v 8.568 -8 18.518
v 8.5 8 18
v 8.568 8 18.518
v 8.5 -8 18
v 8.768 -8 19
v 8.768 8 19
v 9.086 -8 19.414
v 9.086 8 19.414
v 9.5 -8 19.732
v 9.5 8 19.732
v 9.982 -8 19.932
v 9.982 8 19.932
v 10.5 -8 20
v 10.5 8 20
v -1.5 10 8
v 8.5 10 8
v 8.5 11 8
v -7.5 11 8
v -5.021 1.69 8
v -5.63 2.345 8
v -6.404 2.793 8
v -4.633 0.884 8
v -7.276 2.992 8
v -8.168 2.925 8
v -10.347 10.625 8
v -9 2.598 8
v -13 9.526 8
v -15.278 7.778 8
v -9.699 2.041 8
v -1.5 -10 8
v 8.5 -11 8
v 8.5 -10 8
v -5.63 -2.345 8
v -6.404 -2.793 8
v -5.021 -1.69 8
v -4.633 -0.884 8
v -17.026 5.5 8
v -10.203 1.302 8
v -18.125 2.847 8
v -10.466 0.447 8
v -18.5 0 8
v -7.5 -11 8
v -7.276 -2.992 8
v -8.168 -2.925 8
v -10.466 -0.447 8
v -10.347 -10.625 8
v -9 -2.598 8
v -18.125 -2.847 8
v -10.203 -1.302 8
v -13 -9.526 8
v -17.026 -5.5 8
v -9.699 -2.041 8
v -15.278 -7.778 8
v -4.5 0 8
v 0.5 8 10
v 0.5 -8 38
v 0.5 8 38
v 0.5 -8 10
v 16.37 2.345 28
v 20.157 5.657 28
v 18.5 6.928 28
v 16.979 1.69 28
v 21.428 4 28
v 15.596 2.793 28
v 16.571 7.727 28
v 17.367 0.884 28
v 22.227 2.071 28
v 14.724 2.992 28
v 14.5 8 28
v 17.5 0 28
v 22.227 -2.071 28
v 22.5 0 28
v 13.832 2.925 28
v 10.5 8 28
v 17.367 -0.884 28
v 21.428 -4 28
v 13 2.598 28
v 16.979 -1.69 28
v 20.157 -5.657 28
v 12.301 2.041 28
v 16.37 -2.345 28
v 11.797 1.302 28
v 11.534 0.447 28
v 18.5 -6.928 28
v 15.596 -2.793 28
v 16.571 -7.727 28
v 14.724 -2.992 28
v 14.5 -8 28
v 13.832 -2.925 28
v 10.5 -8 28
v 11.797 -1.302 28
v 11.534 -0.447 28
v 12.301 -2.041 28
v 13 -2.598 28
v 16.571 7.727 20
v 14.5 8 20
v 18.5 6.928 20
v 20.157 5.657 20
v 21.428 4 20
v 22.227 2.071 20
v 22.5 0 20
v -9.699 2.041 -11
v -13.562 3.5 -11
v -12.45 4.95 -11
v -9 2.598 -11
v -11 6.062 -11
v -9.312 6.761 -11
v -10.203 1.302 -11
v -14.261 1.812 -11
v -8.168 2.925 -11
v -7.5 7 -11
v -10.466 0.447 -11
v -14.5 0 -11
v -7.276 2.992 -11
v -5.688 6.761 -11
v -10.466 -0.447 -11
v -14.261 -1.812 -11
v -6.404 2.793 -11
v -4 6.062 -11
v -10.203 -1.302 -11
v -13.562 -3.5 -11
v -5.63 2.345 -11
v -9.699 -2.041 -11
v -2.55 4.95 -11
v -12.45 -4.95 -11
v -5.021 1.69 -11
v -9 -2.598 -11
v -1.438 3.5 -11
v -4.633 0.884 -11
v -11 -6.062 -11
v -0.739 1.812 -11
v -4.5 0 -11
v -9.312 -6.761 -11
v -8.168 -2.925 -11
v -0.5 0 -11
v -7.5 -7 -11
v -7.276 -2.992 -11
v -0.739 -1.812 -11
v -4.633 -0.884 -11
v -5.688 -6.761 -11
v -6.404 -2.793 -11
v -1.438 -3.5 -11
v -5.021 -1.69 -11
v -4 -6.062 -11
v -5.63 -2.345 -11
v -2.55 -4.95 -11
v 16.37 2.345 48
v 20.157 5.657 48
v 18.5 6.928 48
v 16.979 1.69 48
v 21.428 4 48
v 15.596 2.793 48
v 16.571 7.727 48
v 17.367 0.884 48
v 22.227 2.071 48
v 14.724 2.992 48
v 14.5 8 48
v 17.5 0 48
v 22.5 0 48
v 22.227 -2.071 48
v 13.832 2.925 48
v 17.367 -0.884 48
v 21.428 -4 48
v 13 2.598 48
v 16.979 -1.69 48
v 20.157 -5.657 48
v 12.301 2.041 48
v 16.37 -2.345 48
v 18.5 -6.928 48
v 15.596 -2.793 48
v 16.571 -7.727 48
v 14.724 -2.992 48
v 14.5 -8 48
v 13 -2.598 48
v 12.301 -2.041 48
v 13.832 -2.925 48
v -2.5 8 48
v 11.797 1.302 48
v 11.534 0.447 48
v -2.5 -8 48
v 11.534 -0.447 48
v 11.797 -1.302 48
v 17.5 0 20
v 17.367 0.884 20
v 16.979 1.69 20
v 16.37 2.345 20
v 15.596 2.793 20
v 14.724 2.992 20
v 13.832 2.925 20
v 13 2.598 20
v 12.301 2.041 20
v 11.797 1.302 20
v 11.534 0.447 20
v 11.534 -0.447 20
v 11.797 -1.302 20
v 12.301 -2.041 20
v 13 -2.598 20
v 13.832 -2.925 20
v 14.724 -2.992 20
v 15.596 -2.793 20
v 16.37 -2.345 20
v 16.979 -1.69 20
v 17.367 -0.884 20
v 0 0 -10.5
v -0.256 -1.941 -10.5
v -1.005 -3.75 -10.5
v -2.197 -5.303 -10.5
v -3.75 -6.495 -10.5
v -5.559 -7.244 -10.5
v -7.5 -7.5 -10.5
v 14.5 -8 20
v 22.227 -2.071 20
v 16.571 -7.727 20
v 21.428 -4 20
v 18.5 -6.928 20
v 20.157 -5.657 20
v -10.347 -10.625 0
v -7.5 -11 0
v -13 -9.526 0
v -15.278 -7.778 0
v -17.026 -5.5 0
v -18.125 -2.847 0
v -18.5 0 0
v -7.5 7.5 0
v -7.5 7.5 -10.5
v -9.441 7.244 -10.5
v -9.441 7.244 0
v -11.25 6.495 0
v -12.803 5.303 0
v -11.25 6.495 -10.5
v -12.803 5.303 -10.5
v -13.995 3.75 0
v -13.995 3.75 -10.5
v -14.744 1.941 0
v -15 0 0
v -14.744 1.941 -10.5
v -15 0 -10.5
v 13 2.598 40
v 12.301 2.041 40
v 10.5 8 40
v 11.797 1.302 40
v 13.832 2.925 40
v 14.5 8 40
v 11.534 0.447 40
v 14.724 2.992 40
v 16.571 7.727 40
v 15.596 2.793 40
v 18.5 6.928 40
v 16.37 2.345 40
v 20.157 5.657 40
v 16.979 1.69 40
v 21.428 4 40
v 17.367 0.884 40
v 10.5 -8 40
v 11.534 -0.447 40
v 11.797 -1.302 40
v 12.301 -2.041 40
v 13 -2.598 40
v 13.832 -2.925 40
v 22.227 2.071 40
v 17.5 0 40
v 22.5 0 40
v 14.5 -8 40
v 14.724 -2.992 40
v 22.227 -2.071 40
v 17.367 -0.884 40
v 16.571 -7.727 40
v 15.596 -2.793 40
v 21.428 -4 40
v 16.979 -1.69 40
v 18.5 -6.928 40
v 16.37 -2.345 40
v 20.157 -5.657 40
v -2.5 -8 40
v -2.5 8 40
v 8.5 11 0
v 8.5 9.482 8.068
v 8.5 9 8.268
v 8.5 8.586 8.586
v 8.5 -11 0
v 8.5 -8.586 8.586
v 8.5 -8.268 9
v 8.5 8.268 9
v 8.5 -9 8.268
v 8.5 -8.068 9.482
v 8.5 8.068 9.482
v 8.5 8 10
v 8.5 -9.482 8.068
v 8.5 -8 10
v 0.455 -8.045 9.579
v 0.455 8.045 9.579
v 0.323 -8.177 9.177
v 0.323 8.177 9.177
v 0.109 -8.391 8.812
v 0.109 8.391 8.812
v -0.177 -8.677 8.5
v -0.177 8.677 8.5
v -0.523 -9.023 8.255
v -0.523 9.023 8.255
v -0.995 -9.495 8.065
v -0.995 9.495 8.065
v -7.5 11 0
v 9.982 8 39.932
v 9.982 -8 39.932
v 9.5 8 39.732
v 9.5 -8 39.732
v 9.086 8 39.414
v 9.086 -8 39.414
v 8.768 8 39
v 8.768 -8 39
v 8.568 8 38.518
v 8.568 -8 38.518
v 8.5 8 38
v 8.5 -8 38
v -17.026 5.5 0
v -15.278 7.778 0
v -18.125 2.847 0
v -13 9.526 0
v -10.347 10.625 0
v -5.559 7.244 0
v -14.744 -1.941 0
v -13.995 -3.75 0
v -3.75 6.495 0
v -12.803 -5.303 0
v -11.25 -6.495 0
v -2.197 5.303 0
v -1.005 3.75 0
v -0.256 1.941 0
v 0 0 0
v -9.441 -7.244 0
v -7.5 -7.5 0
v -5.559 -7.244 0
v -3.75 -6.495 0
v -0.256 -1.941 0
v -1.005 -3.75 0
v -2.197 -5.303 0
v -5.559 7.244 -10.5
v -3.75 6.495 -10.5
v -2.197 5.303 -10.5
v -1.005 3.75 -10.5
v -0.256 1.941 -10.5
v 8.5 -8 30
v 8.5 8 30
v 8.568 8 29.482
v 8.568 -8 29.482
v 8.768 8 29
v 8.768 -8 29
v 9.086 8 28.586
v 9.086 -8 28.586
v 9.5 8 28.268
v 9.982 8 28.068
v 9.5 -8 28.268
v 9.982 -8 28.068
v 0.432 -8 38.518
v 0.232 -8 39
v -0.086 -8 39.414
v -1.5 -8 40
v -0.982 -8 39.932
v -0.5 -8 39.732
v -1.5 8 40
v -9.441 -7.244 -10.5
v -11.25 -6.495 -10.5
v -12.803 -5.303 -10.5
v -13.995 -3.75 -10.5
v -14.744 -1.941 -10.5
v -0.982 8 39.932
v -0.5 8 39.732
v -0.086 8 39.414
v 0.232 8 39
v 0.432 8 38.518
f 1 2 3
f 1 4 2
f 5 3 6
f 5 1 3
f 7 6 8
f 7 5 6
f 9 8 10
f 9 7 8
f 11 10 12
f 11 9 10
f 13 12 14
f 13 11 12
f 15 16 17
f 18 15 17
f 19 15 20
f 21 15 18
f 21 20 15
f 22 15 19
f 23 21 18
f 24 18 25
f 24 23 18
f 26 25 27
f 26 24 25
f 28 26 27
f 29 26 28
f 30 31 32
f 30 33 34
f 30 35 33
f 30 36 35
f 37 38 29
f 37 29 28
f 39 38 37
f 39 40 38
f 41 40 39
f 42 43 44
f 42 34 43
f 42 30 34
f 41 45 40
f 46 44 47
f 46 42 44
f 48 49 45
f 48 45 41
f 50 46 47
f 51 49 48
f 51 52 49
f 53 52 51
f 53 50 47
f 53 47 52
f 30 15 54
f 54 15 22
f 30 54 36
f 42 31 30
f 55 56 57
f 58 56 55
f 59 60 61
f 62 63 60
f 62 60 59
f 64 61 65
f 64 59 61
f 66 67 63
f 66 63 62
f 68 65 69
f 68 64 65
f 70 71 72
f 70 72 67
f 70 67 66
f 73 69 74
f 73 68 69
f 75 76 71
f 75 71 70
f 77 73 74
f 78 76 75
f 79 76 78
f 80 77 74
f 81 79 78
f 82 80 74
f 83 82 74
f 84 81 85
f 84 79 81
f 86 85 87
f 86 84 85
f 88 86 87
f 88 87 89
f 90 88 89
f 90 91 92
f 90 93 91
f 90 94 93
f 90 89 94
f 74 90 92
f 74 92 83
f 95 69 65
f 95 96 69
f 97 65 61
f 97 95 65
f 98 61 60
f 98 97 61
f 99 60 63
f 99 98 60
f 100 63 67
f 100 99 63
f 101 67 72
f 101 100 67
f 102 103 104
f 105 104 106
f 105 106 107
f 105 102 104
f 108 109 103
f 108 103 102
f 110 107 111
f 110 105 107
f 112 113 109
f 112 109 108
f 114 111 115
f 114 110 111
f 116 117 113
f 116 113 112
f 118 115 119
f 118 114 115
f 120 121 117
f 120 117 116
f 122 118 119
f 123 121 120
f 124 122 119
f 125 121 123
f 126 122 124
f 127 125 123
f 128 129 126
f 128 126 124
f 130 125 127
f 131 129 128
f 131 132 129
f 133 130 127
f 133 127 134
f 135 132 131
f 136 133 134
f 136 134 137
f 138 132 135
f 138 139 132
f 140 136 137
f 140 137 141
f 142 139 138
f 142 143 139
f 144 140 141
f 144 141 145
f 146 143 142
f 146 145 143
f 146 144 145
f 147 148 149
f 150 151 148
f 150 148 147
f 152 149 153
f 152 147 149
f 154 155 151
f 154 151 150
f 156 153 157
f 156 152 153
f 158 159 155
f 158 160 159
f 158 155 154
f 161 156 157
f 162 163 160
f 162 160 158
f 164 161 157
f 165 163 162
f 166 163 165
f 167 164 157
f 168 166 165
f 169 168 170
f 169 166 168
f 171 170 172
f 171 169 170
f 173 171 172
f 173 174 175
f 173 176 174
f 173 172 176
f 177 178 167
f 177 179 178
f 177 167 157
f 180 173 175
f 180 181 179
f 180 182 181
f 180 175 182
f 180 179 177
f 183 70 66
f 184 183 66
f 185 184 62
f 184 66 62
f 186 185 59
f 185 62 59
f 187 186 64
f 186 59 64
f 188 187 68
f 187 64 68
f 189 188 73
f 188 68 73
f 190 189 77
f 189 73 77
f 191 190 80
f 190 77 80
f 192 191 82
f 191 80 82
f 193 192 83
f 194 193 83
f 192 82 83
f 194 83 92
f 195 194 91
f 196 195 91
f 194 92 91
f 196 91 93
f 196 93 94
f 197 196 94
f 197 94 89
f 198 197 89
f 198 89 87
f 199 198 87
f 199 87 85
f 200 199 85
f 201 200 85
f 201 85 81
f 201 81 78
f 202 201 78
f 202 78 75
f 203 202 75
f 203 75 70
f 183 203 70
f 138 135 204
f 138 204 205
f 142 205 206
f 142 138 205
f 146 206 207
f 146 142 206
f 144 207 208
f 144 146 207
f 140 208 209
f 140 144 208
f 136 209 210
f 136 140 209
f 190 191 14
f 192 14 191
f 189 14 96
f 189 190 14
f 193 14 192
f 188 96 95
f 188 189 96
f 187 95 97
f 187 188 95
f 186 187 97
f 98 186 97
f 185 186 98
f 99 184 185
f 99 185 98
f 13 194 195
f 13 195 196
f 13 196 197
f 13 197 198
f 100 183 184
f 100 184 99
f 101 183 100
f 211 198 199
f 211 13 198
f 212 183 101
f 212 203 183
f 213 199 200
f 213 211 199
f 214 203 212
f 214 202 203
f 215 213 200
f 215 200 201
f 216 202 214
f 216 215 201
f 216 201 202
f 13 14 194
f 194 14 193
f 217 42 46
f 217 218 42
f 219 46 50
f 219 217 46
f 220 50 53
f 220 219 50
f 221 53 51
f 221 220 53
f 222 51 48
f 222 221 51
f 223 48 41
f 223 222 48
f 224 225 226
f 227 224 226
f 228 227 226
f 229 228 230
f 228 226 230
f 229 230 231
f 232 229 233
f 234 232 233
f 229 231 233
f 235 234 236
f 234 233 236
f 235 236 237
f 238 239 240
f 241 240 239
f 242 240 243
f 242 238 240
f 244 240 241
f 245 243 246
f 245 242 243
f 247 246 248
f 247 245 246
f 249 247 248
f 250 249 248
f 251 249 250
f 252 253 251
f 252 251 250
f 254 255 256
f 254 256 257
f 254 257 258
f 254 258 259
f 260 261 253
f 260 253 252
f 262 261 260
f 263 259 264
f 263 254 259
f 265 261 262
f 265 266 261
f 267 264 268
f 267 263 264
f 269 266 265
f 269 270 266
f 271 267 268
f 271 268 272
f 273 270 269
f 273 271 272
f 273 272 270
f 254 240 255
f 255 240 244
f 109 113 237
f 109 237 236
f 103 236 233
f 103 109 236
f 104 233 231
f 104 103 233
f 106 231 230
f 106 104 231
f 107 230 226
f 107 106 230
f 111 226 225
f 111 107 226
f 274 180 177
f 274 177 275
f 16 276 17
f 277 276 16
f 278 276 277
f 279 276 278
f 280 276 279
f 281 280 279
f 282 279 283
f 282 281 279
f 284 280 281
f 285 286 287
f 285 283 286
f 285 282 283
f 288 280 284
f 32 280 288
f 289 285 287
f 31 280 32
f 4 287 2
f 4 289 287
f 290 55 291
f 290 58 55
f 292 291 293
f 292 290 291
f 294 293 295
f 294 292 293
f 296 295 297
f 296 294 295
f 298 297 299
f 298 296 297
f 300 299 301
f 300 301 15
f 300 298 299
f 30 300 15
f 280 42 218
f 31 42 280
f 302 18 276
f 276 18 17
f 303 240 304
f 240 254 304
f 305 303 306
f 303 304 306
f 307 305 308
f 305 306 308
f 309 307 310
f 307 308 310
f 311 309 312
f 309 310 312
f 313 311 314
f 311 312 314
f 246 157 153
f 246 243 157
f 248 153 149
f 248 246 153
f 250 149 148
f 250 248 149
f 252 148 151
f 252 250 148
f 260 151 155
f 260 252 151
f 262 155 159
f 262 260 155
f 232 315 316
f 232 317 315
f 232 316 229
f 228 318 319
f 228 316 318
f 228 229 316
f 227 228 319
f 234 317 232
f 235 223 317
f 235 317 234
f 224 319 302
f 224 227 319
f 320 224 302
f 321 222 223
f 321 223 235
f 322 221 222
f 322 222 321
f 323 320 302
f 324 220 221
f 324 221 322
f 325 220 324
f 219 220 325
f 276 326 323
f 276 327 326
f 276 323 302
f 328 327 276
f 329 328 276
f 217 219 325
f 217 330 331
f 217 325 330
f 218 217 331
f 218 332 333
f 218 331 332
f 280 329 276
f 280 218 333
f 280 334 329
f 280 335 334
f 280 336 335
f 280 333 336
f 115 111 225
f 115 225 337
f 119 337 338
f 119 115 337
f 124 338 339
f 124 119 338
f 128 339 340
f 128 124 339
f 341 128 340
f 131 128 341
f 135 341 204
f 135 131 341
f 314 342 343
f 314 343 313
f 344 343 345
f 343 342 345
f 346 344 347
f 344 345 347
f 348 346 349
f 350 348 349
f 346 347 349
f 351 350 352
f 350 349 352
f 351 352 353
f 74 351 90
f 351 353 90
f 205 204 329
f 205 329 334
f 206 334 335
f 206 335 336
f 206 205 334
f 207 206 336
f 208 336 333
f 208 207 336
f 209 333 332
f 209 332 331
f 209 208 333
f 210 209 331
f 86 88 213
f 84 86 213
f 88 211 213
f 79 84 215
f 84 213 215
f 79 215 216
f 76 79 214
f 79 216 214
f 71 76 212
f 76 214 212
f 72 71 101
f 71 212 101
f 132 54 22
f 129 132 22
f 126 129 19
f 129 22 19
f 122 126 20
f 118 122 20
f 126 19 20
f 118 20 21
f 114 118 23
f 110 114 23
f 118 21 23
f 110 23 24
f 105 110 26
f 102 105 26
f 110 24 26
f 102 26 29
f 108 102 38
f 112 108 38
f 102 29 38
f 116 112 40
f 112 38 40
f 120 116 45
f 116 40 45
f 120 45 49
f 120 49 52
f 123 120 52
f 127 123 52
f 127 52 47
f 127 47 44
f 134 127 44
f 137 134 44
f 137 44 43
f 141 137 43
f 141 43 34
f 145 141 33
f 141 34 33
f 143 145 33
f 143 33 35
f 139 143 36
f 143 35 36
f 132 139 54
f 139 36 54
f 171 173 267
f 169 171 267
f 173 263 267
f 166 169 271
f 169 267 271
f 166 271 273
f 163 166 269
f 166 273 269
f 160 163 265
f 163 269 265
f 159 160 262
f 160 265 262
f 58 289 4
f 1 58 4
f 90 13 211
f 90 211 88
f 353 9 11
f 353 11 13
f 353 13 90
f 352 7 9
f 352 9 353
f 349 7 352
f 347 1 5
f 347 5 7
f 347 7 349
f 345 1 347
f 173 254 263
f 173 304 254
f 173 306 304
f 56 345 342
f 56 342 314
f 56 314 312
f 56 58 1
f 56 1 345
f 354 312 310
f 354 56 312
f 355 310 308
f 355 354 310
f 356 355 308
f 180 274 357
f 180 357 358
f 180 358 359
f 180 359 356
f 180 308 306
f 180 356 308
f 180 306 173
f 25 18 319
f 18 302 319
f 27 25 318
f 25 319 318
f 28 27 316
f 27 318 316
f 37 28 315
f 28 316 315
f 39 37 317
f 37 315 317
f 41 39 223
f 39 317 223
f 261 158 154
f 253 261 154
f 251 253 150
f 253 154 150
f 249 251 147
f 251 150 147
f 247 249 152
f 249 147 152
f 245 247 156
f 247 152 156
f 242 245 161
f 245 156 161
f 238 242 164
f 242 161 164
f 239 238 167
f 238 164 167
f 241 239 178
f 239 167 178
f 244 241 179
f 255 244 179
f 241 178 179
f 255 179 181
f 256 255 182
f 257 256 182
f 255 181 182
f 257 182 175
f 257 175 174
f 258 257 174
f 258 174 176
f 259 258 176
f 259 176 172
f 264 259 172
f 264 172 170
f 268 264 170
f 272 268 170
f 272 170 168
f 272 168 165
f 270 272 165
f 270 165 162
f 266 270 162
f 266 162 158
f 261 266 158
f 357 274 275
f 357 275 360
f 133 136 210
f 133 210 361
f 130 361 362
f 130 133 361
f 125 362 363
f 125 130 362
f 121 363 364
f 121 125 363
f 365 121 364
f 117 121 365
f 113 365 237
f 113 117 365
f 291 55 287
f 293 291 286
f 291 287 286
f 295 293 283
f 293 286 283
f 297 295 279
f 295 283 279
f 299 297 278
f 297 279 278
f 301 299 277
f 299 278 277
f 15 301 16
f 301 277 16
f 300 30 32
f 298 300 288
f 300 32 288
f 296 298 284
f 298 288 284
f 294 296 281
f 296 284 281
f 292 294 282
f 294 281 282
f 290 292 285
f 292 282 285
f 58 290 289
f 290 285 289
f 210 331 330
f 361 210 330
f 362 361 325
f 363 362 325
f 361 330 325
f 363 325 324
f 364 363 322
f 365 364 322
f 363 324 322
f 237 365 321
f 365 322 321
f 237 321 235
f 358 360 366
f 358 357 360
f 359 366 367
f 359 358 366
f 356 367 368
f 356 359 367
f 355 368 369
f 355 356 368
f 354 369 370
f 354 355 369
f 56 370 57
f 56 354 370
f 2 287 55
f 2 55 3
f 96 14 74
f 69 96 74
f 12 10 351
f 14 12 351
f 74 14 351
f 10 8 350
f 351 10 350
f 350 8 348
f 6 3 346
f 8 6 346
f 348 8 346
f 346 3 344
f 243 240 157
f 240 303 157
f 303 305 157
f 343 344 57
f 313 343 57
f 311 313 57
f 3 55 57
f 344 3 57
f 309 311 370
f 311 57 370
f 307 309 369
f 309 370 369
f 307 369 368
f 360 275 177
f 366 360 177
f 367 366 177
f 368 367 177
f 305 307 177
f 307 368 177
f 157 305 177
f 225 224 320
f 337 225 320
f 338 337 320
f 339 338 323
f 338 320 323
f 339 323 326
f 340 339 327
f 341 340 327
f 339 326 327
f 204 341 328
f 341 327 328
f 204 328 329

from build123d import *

# Parameters (mm, degrees)
F1_DEPTH  = 11
F2_W      = 8
F2_H      = 45
F2_W_2    = 8.5
F2_H_2    = 15
F3_DEPTH  = 25
F4_R      = 7.49999
F5_R      = 10.99999
F6_R      = 7.99999
F7_R      = 2
F8_R      = 3
F9_DEPTH  = 19
F10_R     = 3
F11_DEPTH = 35
F12_SIZE  = 0.5


# Not quite as in the source:
# - a fillet or chamfer is up to 0.001 mm smaller than in the source, because OpenCascade refuses the exact size


with BuildPart() as f1:
    # F0 (on Front) → F1 (new body, symmetric)
    with BuildSketch(Plane.XZ):
        Polygon((-15, -11), (0, -11), (0, 0), (8.5, 0), (8.5, 20), (22.5, 20), (22.5, 28), (8.5, 28), (8.5, 40), (22.5, 40), (22.5, 48), (-2.5, 48), (-2.5, 40), (0.5, 40), (0.5, 8), (-18.5, 8), (-18.5, 0), (-15, 0), align=None)
    extrude(amount=F1_DEPTH, both=True)

    # F2 (on Right) → F3 (cut, symmetric)
    with BuildSketch(Plane.YZ):
        with Locations((-12, 30.5)):
            Rectangle(F2_W, F2_H)
        with Locations((12, 30.5)):
            Rectangle(F2_W, F2_H)
        with Locations((-11.75, -7.5)):
            Rectangle(F2_W_2, F2_H_2)
        with Locations((11.75, -7.5)):
            Rectangle(F2_W_2, F2_H_2)
    extrude(amount=F3_DEPTH, both=True, mode=Mode.SUBTRACT)

    # F4 (radius 7.5 in the source; OpenCascade refuses exactly that, so slightly less here)
    f4_edges = [f1.edges().sort_by_distance(p)[0] for p in [
        (0, -7.5, -5.5),
        (-15, -7.5, -5.5),
        (0, 7.5, -5.5),
        (-15, 7.5, -5.5),
    ]]
    fillet(f4_edges, radius=F4_R)

    # F5 (radius 11 in the source; OpenCascade refuses exactly that, so slightly less here)
    f5_edges = [f1.edges().sort_by_distance(p)[0] for p in [
        (-18.5, 11, 4),
        (-18.5, -11, 4),
    ]]
    fillet(f5_edges, radius=F5_R)

    # F6 (radius 8 in the source; OpenCascade refuses exactly that, so slightly less here)
    f6_edges = [f1.edges().sort_by_distance(p)[0] for p in [
        (22.5, 8, 44),
        (22.5, 8, 24),
        (22.5, -8, 24),
        (22.5, -8, 44),
    ]]
    fillet(f6_edges, radius=F6_R)

    # F7
    f7_edges = [f1.edges().sort_by_distance(p)[0] for p in [
        (8.5, 0, 28),
        (8.5, 0, 40),
        (0.5, 0, 40),
        (0.5, 0, 8),
        (4.5, -8, 8),
        (4.5, 8, 8),
        (8.5, 0, 20),
    ]]
    fillet(f7_edges, radius=F7_R)

    # F8 (on face) → F9 (cut)
    with BuildSketch(Plane.XY.offset(8)):
        with Locations((-7.5, 0)):
            Circle(F8_R)
    extrude(amount=-F9_DEPTH, mode=Mode.SUBTRACT)

    # F10 (on face) → F11 (cut)
    with BuildSketch(Plane.XY.offset(48)):
        with Locations((14.5, 0)):
            Circle(F10_R)
    extrude(amount=-F11_DEPTH, mode=Mode.SUBTRACT)

    # F12
    f12_edges = [f1.edges().sort_by_distance(p)[0] for p in [
        (-12.803304, -5.303304, -11),
    ]]
    chamfer(f12_edges, length=F12_SIZE)


solid = f1.part
